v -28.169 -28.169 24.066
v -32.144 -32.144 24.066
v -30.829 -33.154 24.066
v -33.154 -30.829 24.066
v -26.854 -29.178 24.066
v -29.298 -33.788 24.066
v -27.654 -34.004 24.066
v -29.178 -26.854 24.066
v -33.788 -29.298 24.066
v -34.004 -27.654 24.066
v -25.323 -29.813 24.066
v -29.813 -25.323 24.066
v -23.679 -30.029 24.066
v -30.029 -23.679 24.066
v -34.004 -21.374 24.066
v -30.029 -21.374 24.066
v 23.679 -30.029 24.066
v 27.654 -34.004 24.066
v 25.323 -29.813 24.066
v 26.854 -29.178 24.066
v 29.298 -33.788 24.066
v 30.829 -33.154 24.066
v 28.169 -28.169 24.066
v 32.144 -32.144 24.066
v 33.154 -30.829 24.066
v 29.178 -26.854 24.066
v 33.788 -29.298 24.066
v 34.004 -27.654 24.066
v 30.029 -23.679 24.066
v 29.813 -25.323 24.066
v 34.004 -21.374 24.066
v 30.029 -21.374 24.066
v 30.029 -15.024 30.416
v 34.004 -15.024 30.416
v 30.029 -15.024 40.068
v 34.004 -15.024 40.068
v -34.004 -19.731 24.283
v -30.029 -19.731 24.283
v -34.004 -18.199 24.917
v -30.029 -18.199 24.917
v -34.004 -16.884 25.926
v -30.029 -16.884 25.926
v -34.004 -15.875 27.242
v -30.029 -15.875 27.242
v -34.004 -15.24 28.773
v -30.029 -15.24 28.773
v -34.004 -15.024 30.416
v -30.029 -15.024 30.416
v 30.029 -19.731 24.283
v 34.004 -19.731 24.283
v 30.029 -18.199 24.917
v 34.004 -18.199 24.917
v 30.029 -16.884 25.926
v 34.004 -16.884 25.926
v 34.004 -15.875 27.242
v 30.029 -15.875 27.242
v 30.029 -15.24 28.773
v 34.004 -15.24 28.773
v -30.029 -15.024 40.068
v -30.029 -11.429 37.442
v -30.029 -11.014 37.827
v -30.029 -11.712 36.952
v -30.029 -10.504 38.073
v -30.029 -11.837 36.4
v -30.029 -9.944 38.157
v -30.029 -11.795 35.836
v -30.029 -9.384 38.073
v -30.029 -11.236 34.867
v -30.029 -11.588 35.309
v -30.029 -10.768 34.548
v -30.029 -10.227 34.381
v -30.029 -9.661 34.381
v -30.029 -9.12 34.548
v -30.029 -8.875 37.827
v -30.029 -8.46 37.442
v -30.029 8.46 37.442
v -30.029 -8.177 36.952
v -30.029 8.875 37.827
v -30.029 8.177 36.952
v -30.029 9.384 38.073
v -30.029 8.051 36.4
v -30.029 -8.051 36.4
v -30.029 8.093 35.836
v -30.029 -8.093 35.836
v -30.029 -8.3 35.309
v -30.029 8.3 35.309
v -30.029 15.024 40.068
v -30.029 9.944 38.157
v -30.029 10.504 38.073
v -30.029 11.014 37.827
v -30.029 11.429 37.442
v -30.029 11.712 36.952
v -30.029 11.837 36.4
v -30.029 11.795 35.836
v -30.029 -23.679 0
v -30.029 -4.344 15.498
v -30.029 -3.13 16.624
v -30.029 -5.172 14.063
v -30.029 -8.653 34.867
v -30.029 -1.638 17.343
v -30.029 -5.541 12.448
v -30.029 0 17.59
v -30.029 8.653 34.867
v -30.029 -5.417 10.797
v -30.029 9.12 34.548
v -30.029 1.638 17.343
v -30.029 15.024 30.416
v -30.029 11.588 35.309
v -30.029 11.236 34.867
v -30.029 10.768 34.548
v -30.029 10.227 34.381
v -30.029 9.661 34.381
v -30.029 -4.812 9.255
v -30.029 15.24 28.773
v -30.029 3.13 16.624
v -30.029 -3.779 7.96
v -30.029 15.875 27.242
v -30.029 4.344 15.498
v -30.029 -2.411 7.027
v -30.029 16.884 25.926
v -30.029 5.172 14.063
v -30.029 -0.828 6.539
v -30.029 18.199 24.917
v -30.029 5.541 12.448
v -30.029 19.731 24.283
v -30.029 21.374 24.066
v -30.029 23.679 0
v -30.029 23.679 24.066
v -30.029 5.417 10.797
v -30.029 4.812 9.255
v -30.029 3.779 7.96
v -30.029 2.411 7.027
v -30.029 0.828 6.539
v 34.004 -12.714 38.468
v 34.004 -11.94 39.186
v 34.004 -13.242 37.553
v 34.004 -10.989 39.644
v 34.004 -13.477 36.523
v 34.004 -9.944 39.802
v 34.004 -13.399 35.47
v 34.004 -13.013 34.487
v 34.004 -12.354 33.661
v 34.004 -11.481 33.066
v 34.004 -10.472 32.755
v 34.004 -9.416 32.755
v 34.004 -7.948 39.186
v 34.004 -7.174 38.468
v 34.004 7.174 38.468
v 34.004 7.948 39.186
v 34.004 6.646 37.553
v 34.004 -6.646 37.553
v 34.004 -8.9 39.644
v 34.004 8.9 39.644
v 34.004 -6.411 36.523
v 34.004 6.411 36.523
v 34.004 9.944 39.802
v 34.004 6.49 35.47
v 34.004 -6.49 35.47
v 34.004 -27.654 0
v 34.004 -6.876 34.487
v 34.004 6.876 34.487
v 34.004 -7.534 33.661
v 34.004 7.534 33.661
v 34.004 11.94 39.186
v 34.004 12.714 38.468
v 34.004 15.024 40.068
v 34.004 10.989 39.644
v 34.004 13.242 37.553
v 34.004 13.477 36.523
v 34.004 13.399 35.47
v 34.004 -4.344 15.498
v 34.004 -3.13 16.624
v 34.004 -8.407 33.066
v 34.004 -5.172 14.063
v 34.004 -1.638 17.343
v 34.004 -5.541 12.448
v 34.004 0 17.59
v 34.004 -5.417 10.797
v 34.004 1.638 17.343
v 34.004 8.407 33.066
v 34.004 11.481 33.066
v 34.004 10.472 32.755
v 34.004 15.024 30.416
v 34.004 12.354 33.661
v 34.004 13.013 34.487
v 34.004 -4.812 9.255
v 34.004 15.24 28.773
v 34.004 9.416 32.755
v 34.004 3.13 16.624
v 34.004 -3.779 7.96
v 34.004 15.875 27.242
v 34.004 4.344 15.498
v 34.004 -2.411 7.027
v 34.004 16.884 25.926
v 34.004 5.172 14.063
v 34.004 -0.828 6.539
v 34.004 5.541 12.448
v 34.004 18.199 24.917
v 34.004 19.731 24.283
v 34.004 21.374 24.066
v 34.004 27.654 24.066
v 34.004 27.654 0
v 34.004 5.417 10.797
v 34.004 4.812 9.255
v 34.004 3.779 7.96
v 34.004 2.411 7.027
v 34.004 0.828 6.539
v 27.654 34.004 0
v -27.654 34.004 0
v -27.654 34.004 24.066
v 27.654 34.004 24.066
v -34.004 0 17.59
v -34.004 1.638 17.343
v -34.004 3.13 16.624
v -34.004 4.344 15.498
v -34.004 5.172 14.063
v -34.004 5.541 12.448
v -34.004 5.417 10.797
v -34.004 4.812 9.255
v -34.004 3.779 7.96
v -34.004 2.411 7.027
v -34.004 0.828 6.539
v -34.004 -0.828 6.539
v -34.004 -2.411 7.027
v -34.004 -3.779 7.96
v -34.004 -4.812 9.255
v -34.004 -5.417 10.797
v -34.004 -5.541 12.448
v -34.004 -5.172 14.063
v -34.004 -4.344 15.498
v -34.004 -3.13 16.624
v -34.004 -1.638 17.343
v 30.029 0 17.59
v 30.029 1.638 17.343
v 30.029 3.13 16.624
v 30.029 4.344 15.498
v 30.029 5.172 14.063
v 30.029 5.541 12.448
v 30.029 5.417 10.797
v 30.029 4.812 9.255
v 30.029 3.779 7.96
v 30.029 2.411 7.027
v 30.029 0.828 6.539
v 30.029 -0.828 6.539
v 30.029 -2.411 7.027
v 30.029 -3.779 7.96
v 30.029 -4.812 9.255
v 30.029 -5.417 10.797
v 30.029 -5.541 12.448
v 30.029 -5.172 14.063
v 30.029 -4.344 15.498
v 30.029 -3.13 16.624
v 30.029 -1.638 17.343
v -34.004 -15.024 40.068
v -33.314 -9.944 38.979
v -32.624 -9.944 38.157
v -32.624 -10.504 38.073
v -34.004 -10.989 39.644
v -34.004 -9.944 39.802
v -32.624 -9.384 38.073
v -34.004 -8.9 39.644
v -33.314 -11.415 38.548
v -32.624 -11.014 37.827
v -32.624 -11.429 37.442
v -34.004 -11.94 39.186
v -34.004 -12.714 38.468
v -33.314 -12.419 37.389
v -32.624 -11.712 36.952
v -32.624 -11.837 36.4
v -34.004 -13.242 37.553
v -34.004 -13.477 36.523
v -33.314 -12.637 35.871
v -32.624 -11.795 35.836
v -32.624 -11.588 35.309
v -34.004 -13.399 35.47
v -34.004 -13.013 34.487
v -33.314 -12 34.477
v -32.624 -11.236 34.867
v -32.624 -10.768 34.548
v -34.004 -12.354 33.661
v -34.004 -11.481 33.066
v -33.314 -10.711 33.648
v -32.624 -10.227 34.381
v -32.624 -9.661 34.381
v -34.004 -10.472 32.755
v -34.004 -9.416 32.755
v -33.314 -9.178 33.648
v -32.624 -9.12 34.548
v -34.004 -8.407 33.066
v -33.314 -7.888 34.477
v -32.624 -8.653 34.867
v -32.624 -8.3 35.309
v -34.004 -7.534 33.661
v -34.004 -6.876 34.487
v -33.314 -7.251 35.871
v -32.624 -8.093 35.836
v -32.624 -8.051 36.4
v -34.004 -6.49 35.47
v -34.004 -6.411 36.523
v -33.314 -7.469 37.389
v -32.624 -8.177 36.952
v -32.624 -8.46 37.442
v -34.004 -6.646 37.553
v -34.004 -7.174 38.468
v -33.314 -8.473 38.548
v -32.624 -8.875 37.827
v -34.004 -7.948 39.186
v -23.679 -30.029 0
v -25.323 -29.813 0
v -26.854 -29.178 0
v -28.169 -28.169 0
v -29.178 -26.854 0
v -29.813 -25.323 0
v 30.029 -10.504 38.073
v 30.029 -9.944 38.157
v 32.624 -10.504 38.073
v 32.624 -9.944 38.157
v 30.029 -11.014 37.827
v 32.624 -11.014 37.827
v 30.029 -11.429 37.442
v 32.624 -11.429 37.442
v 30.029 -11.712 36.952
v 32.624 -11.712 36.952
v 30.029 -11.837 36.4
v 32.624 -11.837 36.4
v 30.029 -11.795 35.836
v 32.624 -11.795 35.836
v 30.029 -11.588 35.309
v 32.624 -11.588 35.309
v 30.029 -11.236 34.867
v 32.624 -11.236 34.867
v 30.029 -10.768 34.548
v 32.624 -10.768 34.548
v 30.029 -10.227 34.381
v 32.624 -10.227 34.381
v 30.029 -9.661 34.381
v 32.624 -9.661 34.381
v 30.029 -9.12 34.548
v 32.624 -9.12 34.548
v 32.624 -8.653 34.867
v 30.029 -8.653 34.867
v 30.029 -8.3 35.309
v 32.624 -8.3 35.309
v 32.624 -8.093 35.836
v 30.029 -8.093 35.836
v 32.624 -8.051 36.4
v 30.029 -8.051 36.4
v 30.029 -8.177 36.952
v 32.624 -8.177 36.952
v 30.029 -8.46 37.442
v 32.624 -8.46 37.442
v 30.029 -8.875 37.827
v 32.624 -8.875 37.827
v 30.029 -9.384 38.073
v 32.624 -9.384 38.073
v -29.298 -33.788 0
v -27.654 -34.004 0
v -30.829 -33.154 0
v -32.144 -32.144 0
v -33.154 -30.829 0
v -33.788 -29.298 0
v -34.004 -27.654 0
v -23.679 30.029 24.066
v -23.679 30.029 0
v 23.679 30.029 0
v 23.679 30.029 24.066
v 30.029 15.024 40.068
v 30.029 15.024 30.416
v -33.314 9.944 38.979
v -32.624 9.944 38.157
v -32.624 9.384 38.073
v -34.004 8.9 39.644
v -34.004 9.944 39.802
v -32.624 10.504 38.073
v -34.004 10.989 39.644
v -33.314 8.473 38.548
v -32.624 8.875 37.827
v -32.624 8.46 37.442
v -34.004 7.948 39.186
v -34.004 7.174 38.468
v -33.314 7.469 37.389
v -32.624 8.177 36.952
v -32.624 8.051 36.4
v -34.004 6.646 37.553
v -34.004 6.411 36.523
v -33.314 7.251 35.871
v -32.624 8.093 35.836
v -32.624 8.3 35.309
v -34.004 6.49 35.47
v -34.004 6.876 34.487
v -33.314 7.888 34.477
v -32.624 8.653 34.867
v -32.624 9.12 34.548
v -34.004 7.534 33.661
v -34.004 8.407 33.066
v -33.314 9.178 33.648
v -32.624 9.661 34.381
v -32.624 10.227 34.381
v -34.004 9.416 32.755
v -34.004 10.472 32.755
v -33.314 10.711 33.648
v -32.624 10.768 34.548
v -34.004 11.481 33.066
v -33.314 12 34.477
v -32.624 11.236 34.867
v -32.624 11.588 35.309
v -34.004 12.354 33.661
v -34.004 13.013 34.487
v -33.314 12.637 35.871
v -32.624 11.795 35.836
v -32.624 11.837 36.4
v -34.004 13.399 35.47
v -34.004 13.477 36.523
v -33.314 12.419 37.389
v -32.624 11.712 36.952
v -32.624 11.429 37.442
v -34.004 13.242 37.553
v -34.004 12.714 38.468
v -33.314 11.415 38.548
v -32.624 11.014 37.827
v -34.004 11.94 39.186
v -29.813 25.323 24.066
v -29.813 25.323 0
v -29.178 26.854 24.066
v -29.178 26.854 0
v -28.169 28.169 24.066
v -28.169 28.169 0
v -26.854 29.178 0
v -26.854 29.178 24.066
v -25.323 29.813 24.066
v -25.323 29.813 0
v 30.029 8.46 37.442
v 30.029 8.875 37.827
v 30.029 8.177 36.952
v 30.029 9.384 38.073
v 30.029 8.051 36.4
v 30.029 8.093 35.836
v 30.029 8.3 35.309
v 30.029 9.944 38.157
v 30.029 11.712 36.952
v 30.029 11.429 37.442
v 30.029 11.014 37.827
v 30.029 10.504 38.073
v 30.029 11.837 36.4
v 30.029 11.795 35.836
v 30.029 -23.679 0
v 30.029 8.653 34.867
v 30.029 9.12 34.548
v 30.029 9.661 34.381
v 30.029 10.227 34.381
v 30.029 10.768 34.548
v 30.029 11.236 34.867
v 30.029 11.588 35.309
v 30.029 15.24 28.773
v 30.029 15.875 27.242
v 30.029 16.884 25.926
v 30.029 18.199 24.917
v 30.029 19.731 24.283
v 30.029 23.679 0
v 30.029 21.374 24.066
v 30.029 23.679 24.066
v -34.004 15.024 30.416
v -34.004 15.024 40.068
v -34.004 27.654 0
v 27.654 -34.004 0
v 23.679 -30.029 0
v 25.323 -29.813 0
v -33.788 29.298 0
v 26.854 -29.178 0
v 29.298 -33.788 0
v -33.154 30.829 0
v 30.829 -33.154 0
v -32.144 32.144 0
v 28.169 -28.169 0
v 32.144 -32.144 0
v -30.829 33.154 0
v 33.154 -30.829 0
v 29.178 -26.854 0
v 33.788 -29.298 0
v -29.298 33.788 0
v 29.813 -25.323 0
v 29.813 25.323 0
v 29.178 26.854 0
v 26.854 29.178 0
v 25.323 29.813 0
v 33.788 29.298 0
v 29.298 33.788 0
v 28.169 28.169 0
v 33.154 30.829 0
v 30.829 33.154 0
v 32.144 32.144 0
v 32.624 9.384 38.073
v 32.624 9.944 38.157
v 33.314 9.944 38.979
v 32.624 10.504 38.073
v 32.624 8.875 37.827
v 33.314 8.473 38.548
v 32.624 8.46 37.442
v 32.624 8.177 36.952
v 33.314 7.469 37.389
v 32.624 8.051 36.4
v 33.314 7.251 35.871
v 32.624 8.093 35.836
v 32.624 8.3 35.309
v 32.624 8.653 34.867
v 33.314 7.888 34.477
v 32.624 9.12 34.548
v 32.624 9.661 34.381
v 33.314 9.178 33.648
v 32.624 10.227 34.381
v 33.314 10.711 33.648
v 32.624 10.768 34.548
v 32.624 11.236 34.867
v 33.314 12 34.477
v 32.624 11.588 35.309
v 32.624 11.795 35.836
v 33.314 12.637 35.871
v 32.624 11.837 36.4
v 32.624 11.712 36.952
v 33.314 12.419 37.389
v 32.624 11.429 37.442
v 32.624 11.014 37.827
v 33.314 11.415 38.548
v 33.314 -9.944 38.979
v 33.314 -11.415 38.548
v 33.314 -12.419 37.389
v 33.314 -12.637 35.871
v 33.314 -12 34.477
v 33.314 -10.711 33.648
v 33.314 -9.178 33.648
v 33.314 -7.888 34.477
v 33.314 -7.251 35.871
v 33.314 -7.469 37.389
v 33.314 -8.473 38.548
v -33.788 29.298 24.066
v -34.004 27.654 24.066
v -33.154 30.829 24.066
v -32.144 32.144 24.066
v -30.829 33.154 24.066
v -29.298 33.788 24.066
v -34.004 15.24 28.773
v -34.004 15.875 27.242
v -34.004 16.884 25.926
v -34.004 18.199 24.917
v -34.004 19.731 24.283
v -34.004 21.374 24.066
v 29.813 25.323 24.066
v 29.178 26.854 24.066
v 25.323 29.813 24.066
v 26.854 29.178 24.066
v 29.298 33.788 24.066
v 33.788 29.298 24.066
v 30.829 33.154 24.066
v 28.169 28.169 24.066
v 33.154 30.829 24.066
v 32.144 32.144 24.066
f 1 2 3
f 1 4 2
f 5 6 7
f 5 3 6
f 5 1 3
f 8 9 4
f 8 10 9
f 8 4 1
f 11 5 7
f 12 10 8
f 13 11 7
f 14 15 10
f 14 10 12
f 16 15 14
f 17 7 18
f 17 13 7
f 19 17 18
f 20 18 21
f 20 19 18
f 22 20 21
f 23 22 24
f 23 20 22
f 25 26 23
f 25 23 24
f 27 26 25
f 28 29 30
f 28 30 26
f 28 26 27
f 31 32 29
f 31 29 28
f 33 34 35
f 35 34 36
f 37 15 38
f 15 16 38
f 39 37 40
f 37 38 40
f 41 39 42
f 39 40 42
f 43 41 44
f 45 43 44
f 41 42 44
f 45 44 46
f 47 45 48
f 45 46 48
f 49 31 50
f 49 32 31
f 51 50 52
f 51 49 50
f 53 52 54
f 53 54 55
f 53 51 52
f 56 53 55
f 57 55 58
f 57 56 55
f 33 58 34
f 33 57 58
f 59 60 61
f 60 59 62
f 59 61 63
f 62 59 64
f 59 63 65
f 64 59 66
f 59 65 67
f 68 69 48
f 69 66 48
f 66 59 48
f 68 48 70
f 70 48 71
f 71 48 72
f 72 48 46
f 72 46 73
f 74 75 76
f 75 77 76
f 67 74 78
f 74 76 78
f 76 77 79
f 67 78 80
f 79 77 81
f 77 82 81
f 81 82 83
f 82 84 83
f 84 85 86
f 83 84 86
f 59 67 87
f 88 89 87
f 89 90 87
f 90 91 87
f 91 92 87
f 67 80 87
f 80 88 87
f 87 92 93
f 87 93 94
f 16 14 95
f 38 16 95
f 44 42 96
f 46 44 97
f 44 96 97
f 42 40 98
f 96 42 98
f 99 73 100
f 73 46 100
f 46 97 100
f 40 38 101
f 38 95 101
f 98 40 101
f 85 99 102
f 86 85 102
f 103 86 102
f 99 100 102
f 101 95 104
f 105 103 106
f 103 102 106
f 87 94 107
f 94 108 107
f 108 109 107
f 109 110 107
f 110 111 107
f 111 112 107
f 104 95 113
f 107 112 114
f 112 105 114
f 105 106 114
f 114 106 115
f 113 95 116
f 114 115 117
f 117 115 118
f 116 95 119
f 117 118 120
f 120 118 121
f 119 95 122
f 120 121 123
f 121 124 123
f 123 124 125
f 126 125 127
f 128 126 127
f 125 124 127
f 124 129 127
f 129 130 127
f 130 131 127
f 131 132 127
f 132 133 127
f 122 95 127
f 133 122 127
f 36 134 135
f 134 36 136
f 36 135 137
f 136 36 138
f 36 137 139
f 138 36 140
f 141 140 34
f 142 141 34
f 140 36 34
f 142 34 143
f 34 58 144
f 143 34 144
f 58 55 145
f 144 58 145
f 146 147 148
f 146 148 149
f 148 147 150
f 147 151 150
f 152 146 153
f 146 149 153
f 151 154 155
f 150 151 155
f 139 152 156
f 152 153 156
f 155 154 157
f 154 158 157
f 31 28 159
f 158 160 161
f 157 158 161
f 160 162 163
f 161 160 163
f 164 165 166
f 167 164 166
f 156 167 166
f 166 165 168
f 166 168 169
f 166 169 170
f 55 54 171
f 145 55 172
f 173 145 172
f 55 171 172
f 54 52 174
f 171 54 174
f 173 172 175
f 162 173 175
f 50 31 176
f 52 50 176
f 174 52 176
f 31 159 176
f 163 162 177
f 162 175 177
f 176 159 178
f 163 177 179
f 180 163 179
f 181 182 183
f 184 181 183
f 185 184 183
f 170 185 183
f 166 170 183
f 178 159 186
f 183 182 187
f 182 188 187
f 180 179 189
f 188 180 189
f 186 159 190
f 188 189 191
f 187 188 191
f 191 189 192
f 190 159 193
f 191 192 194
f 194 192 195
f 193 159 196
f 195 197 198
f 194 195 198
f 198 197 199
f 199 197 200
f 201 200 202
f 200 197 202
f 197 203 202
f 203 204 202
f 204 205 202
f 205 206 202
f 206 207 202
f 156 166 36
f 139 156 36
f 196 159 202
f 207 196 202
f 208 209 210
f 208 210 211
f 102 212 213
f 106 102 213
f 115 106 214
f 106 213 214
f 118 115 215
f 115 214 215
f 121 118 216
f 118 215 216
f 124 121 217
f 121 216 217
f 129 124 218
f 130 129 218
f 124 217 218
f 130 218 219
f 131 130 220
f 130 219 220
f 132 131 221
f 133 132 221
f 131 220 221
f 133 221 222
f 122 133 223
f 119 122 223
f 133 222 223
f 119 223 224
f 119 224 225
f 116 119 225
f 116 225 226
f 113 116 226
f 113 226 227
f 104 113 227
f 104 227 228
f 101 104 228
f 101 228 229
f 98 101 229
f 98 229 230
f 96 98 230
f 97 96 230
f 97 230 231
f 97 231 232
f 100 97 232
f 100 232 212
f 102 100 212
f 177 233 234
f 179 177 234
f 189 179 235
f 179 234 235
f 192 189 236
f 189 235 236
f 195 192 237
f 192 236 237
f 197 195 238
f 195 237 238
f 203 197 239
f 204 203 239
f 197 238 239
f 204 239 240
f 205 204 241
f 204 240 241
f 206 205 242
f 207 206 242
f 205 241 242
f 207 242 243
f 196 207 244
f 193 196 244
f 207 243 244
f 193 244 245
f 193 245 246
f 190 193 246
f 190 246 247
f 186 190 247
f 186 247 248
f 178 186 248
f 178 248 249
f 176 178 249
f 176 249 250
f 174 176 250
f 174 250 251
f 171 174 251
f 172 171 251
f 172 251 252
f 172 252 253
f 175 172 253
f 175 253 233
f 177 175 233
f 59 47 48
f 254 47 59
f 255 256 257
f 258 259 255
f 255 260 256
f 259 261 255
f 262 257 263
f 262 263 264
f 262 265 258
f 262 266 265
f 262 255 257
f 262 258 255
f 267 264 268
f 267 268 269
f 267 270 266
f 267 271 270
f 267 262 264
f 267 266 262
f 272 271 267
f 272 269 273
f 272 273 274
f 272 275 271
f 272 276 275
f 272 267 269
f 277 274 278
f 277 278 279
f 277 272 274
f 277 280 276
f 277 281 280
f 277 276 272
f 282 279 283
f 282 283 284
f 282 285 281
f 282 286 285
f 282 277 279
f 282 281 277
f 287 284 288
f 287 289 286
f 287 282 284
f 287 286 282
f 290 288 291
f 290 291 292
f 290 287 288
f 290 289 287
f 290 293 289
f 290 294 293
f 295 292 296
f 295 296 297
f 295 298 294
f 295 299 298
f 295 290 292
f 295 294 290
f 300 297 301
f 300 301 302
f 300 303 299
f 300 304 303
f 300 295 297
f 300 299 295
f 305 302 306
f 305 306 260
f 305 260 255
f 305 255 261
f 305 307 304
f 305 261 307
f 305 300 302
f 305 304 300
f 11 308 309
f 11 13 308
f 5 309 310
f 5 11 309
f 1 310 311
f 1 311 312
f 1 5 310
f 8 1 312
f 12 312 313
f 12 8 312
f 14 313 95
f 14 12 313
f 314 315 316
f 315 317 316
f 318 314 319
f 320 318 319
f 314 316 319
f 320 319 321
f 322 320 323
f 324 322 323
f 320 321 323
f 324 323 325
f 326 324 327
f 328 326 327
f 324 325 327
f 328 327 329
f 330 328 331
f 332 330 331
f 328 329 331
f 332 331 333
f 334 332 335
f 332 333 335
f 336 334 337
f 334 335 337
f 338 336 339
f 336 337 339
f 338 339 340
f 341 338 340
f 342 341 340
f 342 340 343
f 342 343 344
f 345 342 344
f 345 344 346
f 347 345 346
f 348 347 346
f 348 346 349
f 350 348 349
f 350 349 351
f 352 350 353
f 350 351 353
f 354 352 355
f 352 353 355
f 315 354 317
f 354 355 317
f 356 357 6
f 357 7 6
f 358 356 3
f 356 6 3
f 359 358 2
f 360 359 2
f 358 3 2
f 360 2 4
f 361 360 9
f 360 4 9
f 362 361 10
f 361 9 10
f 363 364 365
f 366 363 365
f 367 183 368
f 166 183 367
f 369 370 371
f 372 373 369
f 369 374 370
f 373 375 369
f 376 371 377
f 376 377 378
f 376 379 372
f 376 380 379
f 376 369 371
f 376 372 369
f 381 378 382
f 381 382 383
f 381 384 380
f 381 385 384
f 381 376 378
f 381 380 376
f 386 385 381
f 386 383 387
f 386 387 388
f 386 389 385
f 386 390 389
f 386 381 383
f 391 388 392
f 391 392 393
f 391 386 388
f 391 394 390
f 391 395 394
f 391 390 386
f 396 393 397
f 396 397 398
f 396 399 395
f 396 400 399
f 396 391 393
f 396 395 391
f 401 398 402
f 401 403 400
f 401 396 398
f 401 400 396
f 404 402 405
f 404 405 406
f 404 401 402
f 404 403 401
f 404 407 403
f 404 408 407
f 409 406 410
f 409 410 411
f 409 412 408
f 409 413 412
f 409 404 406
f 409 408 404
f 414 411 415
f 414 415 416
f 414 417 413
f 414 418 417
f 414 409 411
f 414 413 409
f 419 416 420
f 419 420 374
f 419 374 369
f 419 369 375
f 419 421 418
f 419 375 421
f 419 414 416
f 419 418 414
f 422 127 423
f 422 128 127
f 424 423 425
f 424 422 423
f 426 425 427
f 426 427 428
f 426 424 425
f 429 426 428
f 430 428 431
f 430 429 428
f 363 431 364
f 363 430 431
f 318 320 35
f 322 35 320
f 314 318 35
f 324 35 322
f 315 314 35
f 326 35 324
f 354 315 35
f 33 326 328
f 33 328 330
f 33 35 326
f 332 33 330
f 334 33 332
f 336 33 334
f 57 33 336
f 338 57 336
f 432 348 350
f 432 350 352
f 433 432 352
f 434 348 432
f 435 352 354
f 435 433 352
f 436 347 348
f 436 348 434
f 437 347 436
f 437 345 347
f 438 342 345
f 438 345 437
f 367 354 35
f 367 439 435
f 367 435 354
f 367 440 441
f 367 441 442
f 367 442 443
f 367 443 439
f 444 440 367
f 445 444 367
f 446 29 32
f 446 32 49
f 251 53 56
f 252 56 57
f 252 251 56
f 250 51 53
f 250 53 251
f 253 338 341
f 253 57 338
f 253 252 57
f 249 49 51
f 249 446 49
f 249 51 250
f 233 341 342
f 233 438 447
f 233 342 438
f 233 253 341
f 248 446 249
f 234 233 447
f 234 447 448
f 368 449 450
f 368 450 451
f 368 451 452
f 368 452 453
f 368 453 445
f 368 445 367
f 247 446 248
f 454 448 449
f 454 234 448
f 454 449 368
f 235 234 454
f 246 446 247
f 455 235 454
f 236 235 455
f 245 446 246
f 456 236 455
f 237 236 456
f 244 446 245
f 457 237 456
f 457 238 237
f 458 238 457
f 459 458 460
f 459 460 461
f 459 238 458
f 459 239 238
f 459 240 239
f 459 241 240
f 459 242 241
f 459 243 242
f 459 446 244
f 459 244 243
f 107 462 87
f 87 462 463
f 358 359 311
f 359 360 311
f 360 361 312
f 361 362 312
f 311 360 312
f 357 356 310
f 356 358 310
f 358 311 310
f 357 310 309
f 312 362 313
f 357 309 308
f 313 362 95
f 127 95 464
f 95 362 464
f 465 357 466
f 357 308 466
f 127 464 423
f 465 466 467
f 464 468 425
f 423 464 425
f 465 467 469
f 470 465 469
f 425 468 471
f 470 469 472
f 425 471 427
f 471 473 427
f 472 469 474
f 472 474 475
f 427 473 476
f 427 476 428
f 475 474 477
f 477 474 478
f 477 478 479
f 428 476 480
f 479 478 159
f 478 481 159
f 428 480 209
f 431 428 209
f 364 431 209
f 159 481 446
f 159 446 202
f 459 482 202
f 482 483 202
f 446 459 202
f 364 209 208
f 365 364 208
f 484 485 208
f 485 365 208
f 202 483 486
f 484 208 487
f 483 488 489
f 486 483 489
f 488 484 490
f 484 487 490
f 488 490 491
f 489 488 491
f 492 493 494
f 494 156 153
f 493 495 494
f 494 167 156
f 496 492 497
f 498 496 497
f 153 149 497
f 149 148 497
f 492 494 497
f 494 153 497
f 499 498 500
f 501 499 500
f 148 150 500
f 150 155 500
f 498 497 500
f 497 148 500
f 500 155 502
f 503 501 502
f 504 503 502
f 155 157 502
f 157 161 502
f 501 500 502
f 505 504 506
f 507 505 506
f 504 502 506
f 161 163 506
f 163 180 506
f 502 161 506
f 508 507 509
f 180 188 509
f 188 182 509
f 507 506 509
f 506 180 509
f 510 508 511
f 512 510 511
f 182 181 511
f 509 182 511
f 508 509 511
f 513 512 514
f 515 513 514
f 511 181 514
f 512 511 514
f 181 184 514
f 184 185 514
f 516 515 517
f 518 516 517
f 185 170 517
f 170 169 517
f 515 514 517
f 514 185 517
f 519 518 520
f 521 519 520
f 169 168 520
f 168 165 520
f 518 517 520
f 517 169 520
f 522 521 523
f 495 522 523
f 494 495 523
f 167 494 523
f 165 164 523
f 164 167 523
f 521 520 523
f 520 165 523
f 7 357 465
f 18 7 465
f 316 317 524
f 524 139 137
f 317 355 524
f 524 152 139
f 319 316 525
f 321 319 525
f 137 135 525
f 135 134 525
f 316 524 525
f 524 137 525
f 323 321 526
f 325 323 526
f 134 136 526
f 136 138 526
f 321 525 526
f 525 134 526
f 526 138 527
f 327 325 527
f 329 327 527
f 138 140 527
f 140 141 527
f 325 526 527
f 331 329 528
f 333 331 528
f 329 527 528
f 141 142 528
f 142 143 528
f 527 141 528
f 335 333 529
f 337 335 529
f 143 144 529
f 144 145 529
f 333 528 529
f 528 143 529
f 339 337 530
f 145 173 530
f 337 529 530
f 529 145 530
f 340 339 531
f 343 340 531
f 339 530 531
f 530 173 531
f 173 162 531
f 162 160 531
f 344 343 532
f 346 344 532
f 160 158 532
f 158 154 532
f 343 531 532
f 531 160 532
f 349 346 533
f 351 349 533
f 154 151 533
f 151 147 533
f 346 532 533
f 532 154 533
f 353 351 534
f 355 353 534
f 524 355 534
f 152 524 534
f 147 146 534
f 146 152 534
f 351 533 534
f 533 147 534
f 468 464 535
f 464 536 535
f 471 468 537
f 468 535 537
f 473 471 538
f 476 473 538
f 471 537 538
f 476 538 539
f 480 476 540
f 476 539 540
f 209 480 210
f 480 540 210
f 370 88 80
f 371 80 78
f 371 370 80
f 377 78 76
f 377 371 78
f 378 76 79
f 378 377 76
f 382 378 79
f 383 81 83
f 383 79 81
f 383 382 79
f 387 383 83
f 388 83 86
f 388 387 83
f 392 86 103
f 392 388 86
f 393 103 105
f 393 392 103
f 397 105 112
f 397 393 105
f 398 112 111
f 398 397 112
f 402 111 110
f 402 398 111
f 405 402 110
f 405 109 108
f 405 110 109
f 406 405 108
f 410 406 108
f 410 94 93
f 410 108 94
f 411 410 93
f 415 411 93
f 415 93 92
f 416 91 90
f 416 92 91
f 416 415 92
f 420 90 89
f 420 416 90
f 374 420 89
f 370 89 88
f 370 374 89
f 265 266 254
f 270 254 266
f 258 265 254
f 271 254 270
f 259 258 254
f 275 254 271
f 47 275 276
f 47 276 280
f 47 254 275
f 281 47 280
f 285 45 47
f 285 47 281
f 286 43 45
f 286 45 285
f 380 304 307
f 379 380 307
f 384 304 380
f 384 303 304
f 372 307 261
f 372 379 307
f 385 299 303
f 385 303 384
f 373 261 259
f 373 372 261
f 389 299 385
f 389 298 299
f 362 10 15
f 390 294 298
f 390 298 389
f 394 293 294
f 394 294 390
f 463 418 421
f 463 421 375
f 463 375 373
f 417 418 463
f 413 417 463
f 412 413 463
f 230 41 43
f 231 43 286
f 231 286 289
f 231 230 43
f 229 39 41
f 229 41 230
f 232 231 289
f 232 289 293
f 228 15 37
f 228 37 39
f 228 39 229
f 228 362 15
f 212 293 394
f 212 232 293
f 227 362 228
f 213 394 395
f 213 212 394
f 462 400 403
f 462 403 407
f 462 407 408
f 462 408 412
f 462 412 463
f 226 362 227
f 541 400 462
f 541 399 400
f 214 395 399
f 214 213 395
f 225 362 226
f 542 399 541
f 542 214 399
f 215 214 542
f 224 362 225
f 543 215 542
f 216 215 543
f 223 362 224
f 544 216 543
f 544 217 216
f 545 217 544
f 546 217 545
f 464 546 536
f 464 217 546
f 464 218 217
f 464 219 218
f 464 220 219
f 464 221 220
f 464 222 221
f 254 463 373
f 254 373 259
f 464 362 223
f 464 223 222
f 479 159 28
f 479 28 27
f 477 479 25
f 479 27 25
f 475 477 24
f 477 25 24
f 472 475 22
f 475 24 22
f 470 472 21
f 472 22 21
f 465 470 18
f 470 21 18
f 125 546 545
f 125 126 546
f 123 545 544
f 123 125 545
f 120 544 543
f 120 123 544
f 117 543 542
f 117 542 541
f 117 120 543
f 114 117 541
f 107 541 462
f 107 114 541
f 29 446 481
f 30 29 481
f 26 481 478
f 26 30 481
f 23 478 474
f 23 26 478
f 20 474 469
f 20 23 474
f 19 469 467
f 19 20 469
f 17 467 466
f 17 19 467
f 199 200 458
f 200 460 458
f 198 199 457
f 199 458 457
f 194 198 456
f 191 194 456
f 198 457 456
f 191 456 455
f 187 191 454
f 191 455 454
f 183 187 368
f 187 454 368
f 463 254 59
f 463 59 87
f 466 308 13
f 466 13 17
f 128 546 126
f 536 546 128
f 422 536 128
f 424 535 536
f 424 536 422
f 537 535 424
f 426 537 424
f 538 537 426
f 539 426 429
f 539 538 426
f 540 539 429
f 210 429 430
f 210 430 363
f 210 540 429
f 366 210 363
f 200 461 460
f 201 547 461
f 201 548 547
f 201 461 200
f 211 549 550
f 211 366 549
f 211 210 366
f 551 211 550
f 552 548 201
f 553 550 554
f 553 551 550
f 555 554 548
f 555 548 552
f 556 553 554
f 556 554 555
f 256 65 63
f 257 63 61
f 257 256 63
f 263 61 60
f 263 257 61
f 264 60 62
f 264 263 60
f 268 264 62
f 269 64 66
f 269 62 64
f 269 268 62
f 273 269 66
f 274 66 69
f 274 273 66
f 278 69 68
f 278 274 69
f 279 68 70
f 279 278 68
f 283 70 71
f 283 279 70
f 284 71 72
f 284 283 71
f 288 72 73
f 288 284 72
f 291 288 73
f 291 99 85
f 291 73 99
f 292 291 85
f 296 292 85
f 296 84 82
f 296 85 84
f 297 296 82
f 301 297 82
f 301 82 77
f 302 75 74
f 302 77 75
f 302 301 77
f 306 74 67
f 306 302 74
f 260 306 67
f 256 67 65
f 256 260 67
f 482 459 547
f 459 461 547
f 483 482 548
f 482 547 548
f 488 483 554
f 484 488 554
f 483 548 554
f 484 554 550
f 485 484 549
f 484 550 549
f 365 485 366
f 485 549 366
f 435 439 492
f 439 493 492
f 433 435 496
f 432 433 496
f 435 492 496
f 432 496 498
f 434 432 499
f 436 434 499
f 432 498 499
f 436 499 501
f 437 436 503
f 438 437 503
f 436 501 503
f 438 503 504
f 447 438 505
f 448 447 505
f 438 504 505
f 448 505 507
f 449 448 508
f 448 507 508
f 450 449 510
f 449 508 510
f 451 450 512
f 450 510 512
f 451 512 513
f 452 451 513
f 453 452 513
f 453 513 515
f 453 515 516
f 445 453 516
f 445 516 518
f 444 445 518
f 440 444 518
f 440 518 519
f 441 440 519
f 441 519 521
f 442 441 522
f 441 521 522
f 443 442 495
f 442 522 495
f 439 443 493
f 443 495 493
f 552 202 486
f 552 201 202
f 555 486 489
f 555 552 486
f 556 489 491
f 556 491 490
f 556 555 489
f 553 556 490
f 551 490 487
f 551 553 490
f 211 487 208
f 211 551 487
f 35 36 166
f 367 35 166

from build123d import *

# Parameters (mm, degrees)
SKETCH1_W                                 = 68.0085
SKETCH1_H                                 = 68.0085
SKETCH1_W_2                               = 60.0583
SKETCH1_H_2                               = 60.0583
BOSS_EXTRUDE1_DEPTH                       = 24.0665
F_7_16_0_4375_DIAMETER_HOLE1_D            = 11.1125
SKETCH10_W                                = 16.002
SKETCH10_H                                = 30.0482
BOSS_EXTRUDE2_DEPTH                       = 3.9751
FILLET1_R                                 = 6.35
FILLET1_OF_MIRROR1_R                      = 6.35
FILLET2_R                                 = 6.35
FILLET3_R                                 = 6.35
CSK_FOR_6_FLAT_HEAD_MACHINE_SCREW_2_COUNT = 2
CSK_FOR_6_FLAT_HEAD_MACHINE_SCREW_2_PITCH = 19.8882


with BuildPart() as part:
    # Sketch1 → Boss-Extrude1 (new body)
    with BuildSketch(Plane.XY):
        Rectangle(SKETCH1_W, SKETCH1_H)
        Rectangle(SKETCH1_W_2, SKETCH1_H_2, mode=Mode.SUBTRACT)
    extrude(amount=BOSS_EXTRUDE1_DEPTH)

    # 7/16 (0.4375) Diameter Hole1 (through all)
    with Locations(Plane(origin=(34.00425, 0, 0), x_dir=(0, 0, -1), z_dir=(1, 0, 0))):
        with Locations((-12.03325, 0)):
            Hole(F_7_16_0_4375_DIAMETER_HOLE1_D / 2)

    # Sketch10 → Boss-Extrude2 (add)
    with BuildSketch(Plane.ZY.offset(34.00425)):
        with Locations((32.0675, 0)):
            Rectangle(SKETCH10_W, SKETCH10_H)
    boss_extrude2 = extrude(amount=-BOSS_EXTRUDE2_DEPTH)

    # Fillet1
    fillet1_edges = [part.edges().sort_by_distance(p)[0] for p in [
        (-32.0167, -15.0241, 24.0665),
        (-32.0167, 15.0241, 24.0665),
    ]]
    fillet(fillet1_edges, radius=FILLET1_R)

    # Mirror1: Boss-Extrude2 across plane
    add(boss_extrude2.mirror(Plane(origin=(0, 0, 0), x_dir=(0, 0, 1), z_dir=(1, 0, 0))))

    # Fillet1 of Mirror1
    fillet1_of_mirror1_edges = [part.edges().sort_by_distance(p)[0] for p in [
        (32.0167, -15.0241, 24.0665),
        (32.0167, 15.0241, 24.0665),
    ]]
    fillet(fillet1_of_mirror1_edges, radius=FILLET1_OF_MIRROR1_R)

    # Fillet2
    fillet2_edges = [part.edges().sort_by_distance(p)[0] for p in [
        (34.00425, -34.00425, 12.03325),
        (-34.00425, -34.00425, 12.03325),
        (-34.00425, 34.00425, 12.03325),
        (34.00425, 34.00425, 12.03325),
    ]]
    fillet(fillet2_edges, radius=FILLET2_R)

    # Fillet3
    fillet3_edges = [part.edges().sort_by_distance(p)[0] for p in [
        (30.02915, -30.02915, 12.03325),
        (30.02915, 30.02915, 12.03325),
        (-30.02915, 30.02915, 12.03325),
        (-30.02915, -30.02915, 12.03325),
    ]]
    fillet(fillet3_edges, radius=FILLET3_R)

    # Sketch14 → CSK for #6 Flat Head Machine Screw (100)1 (revolve, cut)
    with BuildSketch(Plane(origin=(-34.00425, 9.9441, 36.2585), x_dir=(0, 0, 1), z_dir=(0, 1, 0))):
        Polygon((0, 0), (0, 10.538824014), (1.89865, 9.398), (1.89865, 1.380025208), (3.5433, 0), align=None)
    csk_for_6_flat_head_machine_screw_100 = revolve(axis=Axis((-40.35425, 9.9441, 36.2585), (1, 0, 0)), mode=Mode.SUBTRACT)

    # CSK for _6 Flat Head Machine Screw _ 2: CSK for #6 Flat Head Machine Screw (100)1 ×2
    with Locations(*[(0, -i * CSK_FOR_6_FLAT_HEAD_MACHINE_SCREW_2_PITCH, 0) for i in range(1, CSK_FOR_6_FLAT_HEAD_MACHINE_SCREW_2_COUNT)]):
        add(csk_for_6_flat_head_machine_screw_100, mode=Mode.SUBTRACT)

    # Mirror2: CSK for #6 Flat Head Machine Screw (100)1 across plane
    add(csk_for_6_flat_head_machine_screw_100.mirror(Plane(origin=(0, 0, 0), x_dir=(0, 0, 1), z_dir=(1, 0, 0))), mode=Mode.SUBTRACT)

    # Mirror2 copy 1 sketch → Mirror2 copy 1 (revolve, cut)
    with BuildSketch(Plane(origin=(34.00425, -9.9441, 36.2585), x_dir=(0, 0, 1), z_dir=(0, 1, 0))):
        Polygon((0, 0), (0, -10.538824014), (1.89865, -9.398), (1.89865, -1.380025208), (3.5433, 0), align=None)
    revolve(axis=Axis((40.35425, -9.9441, 36.2585), (1, 0, 0)), mode=Mode.SUBTRACT)


solid = part.part
